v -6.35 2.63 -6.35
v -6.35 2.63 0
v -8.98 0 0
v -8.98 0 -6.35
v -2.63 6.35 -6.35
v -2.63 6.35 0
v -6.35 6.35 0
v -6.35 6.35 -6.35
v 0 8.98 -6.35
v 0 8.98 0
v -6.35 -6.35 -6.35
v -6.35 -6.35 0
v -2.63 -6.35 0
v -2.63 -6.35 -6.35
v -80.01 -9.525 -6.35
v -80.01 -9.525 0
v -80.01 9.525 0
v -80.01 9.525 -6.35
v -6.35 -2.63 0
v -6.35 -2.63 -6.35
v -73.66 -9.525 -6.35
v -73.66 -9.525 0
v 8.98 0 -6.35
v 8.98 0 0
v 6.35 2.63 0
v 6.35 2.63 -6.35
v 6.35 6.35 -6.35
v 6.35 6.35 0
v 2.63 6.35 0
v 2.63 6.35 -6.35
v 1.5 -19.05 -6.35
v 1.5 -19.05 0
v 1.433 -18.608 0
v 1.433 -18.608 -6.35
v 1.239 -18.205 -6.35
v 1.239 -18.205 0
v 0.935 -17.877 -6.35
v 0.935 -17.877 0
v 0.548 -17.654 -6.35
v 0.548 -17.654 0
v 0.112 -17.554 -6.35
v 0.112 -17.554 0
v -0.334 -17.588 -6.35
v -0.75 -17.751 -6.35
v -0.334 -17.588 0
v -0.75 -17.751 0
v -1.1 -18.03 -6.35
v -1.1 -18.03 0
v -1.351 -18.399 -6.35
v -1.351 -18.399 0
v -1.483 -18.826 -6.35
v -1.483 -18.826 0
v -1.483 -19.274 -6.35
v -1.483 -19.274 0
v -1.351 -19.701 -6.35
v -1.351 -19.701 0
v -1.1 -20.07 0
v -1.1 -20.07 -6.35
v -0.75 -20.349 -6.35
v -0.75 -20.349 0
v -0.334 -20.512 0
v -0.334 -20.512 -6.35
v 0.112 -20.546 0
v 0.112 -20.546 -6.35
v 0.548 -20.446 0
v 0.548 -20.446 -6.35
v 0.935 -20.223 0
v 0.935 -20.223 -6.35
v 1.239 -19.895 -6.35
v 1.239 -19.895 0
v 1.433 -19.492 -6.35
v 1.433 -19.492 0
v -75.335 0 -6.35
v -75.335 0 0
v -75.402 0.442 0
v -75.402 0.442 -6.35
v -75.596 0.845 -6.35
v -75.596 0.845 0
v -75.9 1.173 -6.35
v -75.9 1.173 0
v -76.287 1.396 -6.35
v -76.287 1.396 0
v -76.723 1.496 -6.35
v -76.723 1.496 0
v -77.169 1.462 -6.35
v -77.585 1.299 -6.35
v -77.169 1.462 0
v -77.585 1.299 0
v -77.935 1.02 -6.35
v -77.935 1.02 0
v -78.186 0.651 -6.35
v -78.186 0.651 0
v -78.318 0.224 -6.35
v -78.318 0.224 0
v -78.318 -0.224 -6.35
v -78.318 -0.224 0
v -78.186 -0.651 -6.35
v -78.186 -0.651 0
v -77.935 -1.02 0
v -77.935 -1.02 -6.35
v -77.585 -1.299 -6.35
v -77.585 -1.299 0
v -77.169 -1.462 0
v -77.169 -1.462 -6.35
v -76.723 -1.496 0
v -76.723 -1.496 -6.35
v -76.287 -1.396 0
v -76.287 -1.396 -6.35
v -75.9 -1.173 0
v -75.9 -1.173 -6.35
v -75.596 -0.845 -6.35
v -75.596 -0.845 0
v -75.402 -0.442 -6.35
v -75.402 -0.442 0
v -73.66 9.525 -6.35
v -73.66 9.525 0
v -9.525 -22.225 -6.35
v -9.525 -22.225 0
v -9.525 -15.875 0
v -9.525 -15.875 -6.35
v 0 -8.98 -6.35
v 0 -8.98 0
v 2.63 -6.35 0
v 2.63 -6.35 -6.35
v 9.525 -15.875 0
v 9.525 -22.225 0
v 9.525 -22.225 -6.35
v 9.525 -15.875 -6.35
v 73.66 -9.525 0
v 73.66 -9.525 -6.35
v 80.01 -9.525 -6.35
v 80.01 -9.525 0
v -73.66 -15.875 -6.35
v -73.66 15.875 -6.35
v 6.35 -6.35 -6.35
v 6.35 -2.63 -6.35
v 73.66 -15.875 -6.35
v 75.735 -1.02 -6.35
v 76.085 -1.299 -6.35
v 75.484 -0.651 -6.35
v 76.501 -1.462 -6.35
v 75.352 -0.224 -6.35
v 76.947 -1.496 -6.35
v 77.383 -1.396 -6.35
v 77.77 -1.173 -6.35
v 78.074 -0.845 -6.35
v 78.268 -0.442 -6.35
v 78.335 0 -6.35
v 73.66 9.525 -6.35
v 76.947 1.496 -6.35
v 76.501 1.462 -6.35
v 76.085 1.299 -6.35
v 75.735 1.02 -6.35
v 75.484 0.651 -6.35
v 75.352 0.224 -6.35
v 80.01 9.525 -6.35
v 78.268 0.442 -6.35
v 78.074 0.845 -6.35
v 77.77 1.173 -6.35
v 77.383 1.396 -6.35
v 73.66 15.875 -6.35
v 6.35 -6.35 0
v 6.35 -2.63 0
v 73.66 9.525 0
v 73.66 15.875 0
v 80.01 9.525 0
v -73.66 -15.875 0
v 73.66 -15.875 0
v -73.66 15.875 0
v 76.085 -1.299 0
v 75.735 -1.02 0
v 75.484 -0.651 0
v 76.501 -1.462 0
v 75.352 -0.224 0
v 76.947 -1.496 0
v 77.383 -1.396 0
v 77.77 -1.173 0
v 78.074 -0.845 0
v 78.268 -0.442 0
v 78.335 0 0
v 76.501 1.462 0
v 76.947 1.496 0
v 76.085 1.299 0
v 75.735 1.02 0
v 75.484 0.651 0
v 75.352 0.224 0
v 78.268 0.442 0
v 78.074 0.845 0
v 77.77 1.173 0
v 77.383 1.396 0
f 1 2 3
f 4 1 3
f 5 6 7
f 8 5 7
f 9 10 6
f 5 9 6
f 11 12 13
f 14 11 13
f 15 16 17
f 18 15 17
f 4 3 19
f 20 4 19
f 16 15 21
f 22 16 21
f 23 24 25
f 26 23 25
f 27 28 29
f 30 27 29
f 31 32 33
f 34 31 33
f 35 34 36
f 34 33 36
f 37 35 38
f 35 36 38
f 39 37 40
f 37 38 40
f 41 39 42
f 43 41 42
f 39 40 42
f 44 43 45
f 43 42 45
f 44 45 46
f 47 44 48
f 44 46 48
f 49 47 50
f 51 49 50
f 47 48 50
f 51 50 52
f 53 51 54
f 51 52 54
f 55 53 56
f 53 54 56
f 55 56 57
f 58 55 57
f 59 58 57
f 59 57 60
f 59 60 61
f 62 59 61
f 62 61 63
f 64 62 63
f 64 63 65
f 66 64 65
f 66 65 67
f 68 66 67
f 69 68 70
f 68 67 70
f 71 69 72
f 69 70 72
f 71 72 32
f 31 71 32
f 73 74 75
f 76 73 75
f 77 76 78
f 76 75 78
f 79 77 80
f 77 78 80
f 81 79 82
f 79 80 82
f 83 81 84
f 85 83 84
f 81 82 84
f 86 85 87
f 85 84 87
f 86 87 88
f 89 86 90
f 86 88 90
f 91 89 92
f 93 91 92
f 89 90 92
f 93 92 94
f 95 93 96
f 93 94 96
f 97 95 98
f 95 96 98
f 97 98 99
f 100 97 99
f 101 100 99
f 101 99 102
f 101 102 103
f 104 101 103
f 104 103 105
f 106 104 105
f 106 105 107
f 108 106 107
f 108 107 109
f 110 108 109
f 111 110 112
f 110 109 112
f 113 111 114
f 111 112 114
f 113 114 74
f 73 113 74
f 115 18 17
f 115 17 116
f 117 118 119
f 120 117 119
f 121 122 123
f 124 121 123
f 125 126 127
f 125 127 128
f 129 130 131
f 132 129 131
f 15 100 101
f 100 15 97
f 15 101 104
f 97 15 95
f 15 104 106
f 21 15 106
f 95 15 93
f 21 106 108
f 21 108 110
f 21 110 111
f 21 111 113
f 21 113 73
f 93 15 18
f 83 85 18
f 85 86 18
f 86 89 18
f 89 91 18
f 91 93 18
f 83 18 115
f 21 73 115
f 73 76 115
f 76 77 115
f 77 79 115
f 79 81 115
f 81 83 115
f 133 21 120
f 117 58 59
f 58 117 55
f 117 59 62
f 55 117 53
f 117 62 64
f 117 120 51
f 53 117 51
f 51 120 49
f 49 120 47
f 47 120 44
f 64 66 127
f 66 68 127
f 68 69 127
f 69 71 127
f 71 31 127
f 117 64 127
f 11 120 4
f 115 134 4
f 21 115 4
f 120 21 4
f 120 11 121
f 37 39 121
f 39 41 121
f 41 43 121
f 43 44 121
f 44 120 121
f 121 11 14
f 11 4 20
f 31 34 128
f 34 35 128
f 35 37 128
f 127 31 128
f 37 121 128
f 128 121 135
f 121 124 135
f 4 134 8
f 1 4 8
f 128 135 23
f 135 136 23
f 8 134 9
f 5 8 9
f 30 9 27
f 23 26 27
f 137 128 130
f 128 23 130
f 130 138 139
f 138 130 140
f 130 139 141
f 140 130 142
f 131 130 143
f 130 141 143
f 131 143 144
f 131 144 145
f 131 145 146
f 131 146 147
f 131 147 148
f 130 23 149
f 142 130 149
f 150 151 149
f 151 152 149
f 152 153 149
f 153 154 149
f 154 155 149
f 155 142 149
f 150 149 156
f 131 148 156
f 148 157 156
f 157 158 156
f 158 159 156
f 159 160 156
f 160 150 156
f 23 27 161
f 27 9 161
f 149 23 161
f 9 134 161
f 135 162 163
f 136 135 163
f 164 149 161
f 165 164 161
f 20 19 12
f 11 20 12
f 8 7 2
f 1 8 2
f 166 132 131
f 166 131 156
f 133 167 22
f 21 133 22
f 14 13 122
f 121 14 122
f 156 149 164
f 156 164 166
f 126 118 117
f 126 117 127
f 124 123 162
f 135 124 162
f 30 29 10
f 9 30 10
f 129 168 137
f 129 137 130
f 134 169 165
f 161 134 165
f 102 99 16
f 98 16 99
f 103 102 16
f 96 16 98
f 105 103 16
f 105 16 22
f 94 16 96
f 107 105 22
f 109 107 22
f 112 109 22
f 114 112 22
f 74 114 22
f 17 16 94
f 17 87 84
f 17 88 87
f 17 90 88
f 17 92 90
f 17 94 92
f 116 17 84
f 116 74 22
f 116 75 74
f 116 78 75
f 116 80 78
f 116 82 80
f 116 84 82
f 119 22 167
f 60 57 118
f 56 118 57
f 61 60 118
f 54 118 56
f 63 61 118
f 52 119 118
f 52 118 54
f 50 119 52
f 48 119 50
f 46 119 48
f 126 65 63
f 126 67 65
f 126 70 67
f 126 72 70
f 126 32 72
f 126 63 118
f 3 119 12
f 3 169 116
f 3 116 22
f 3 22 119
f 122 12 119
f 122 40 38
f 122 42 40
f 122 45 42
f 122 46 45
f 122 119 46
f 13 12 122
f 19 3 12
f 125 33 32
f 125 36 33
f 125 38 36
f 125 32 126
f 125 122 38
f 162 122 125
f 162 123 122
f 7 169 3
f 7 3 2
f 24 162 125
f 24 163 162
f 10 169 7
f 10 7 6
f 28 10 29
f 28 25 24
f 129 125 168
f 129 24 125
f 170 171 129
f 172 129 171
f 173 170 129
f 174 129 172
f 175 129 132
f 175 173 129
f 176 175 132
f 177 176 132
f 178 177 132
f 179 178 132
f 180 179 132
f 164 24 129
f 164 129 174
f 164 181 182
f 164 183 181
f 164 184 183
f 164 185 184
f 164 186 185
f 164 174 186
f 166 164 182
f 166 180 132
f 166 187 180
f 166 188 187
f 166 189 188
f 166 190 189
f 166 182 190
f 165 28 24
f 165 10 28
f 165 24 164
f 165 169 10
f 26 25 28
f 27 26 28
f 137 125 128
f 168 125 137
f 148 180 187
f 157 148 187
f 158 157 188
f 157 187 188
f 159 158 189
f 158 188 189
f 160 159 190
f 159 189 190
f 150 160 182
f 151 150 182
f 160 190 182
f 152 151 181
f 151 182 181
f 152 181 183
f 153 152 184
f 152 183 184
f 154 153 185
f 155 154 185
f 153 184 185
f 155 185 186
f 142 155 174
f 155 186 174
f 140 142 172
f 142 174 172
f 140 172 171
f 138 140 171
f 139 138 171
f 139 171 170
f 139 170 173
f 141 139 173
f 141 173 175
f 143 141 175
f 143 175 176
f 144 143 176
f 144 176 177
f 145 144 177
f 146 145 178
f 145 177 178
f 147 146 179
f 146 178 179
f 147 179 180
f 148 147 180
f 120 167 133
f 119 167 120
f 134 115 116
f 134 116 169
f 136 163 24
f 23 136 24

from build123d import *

# Parameters (mm, degrees)
SKETCH1_W           = 147.32
SKETCH1_H           = 31.75
BOSS_EXTRUDE1_DEPTH = 6.35
SKETCH2_W           = 6.35
SKETCH2_H           = 19.05
SKETCH2_R           = 1.5
SKETCH2_W_2         = 19.05
SKETCH2_H_2         = 6.35
BOSS_EXTRUDE2_DEPTH = 6.35
CUT_EXTRUDE1_DEPTH  = 6.35


with BuildPart() as part:
    # Sketch1 → Boss-Extrude1 (new body)
    with BuildSketch(Plane.XY):
        Rectangle(SKETCH1_W, SKETCH1_H)
    extrude(amount=-BOSS_EXTRUDE1_DEPTH)

    # Sketch2 → Boss-Extrude2 (add)
    with BuildSketch(Plane.XY):
        with Locations((76.835, 0)):
            Rectangle(SKETCH2_W, SKETCH2_H)
        with Locations((76.835, 0)):
            Circle(SKETCH2_R, mode=Mode.SUBTRACT)
        with Locations((-76.835, 0)):
            Rectangle(SKETCH2_W, SKETCH2_H)
        with Locations((-76.835, 0)):
            Circle(SKETCH2_R, mode=Mode.SUBTRACT)
        with Locations((0, -19.05)):
            Rectangle(SKETCH2_W_2, SKETCH2_H_2)
        with Locations((0, -19.05)):
            Circle(SKETCH2_R, mode=Mode.SUBTRACT)
    extrude(amount=-BOSS_EXTRUDE2_DEPTH)

    # Sketch3 → Cut-Extrude1 (cut)
    with BuildSketch(Plane.XY):
        Polygon((0, -8.980256121), (2.630256121, -6.35), (6.35, -6.35), (6.35, -2.630256121), (8.980256121, 0), (6.35, 2.630256121), (6.35, 6.35), (2.630256121, 6.35), (0, 8.980256121), (-2.630256121, 6.35), (-6.35, 6.35), (-6.35, 2.630256121), (-8.980256121, 0), (-6.35, -2.630256121), (-6.35, -6.35), (-2.630256121, -6.35), align=None)
    extrude(amount=-CUT_EXTRUDE1_DEPTH, mode=Mode.SUBTRACT)


solid = part.part
